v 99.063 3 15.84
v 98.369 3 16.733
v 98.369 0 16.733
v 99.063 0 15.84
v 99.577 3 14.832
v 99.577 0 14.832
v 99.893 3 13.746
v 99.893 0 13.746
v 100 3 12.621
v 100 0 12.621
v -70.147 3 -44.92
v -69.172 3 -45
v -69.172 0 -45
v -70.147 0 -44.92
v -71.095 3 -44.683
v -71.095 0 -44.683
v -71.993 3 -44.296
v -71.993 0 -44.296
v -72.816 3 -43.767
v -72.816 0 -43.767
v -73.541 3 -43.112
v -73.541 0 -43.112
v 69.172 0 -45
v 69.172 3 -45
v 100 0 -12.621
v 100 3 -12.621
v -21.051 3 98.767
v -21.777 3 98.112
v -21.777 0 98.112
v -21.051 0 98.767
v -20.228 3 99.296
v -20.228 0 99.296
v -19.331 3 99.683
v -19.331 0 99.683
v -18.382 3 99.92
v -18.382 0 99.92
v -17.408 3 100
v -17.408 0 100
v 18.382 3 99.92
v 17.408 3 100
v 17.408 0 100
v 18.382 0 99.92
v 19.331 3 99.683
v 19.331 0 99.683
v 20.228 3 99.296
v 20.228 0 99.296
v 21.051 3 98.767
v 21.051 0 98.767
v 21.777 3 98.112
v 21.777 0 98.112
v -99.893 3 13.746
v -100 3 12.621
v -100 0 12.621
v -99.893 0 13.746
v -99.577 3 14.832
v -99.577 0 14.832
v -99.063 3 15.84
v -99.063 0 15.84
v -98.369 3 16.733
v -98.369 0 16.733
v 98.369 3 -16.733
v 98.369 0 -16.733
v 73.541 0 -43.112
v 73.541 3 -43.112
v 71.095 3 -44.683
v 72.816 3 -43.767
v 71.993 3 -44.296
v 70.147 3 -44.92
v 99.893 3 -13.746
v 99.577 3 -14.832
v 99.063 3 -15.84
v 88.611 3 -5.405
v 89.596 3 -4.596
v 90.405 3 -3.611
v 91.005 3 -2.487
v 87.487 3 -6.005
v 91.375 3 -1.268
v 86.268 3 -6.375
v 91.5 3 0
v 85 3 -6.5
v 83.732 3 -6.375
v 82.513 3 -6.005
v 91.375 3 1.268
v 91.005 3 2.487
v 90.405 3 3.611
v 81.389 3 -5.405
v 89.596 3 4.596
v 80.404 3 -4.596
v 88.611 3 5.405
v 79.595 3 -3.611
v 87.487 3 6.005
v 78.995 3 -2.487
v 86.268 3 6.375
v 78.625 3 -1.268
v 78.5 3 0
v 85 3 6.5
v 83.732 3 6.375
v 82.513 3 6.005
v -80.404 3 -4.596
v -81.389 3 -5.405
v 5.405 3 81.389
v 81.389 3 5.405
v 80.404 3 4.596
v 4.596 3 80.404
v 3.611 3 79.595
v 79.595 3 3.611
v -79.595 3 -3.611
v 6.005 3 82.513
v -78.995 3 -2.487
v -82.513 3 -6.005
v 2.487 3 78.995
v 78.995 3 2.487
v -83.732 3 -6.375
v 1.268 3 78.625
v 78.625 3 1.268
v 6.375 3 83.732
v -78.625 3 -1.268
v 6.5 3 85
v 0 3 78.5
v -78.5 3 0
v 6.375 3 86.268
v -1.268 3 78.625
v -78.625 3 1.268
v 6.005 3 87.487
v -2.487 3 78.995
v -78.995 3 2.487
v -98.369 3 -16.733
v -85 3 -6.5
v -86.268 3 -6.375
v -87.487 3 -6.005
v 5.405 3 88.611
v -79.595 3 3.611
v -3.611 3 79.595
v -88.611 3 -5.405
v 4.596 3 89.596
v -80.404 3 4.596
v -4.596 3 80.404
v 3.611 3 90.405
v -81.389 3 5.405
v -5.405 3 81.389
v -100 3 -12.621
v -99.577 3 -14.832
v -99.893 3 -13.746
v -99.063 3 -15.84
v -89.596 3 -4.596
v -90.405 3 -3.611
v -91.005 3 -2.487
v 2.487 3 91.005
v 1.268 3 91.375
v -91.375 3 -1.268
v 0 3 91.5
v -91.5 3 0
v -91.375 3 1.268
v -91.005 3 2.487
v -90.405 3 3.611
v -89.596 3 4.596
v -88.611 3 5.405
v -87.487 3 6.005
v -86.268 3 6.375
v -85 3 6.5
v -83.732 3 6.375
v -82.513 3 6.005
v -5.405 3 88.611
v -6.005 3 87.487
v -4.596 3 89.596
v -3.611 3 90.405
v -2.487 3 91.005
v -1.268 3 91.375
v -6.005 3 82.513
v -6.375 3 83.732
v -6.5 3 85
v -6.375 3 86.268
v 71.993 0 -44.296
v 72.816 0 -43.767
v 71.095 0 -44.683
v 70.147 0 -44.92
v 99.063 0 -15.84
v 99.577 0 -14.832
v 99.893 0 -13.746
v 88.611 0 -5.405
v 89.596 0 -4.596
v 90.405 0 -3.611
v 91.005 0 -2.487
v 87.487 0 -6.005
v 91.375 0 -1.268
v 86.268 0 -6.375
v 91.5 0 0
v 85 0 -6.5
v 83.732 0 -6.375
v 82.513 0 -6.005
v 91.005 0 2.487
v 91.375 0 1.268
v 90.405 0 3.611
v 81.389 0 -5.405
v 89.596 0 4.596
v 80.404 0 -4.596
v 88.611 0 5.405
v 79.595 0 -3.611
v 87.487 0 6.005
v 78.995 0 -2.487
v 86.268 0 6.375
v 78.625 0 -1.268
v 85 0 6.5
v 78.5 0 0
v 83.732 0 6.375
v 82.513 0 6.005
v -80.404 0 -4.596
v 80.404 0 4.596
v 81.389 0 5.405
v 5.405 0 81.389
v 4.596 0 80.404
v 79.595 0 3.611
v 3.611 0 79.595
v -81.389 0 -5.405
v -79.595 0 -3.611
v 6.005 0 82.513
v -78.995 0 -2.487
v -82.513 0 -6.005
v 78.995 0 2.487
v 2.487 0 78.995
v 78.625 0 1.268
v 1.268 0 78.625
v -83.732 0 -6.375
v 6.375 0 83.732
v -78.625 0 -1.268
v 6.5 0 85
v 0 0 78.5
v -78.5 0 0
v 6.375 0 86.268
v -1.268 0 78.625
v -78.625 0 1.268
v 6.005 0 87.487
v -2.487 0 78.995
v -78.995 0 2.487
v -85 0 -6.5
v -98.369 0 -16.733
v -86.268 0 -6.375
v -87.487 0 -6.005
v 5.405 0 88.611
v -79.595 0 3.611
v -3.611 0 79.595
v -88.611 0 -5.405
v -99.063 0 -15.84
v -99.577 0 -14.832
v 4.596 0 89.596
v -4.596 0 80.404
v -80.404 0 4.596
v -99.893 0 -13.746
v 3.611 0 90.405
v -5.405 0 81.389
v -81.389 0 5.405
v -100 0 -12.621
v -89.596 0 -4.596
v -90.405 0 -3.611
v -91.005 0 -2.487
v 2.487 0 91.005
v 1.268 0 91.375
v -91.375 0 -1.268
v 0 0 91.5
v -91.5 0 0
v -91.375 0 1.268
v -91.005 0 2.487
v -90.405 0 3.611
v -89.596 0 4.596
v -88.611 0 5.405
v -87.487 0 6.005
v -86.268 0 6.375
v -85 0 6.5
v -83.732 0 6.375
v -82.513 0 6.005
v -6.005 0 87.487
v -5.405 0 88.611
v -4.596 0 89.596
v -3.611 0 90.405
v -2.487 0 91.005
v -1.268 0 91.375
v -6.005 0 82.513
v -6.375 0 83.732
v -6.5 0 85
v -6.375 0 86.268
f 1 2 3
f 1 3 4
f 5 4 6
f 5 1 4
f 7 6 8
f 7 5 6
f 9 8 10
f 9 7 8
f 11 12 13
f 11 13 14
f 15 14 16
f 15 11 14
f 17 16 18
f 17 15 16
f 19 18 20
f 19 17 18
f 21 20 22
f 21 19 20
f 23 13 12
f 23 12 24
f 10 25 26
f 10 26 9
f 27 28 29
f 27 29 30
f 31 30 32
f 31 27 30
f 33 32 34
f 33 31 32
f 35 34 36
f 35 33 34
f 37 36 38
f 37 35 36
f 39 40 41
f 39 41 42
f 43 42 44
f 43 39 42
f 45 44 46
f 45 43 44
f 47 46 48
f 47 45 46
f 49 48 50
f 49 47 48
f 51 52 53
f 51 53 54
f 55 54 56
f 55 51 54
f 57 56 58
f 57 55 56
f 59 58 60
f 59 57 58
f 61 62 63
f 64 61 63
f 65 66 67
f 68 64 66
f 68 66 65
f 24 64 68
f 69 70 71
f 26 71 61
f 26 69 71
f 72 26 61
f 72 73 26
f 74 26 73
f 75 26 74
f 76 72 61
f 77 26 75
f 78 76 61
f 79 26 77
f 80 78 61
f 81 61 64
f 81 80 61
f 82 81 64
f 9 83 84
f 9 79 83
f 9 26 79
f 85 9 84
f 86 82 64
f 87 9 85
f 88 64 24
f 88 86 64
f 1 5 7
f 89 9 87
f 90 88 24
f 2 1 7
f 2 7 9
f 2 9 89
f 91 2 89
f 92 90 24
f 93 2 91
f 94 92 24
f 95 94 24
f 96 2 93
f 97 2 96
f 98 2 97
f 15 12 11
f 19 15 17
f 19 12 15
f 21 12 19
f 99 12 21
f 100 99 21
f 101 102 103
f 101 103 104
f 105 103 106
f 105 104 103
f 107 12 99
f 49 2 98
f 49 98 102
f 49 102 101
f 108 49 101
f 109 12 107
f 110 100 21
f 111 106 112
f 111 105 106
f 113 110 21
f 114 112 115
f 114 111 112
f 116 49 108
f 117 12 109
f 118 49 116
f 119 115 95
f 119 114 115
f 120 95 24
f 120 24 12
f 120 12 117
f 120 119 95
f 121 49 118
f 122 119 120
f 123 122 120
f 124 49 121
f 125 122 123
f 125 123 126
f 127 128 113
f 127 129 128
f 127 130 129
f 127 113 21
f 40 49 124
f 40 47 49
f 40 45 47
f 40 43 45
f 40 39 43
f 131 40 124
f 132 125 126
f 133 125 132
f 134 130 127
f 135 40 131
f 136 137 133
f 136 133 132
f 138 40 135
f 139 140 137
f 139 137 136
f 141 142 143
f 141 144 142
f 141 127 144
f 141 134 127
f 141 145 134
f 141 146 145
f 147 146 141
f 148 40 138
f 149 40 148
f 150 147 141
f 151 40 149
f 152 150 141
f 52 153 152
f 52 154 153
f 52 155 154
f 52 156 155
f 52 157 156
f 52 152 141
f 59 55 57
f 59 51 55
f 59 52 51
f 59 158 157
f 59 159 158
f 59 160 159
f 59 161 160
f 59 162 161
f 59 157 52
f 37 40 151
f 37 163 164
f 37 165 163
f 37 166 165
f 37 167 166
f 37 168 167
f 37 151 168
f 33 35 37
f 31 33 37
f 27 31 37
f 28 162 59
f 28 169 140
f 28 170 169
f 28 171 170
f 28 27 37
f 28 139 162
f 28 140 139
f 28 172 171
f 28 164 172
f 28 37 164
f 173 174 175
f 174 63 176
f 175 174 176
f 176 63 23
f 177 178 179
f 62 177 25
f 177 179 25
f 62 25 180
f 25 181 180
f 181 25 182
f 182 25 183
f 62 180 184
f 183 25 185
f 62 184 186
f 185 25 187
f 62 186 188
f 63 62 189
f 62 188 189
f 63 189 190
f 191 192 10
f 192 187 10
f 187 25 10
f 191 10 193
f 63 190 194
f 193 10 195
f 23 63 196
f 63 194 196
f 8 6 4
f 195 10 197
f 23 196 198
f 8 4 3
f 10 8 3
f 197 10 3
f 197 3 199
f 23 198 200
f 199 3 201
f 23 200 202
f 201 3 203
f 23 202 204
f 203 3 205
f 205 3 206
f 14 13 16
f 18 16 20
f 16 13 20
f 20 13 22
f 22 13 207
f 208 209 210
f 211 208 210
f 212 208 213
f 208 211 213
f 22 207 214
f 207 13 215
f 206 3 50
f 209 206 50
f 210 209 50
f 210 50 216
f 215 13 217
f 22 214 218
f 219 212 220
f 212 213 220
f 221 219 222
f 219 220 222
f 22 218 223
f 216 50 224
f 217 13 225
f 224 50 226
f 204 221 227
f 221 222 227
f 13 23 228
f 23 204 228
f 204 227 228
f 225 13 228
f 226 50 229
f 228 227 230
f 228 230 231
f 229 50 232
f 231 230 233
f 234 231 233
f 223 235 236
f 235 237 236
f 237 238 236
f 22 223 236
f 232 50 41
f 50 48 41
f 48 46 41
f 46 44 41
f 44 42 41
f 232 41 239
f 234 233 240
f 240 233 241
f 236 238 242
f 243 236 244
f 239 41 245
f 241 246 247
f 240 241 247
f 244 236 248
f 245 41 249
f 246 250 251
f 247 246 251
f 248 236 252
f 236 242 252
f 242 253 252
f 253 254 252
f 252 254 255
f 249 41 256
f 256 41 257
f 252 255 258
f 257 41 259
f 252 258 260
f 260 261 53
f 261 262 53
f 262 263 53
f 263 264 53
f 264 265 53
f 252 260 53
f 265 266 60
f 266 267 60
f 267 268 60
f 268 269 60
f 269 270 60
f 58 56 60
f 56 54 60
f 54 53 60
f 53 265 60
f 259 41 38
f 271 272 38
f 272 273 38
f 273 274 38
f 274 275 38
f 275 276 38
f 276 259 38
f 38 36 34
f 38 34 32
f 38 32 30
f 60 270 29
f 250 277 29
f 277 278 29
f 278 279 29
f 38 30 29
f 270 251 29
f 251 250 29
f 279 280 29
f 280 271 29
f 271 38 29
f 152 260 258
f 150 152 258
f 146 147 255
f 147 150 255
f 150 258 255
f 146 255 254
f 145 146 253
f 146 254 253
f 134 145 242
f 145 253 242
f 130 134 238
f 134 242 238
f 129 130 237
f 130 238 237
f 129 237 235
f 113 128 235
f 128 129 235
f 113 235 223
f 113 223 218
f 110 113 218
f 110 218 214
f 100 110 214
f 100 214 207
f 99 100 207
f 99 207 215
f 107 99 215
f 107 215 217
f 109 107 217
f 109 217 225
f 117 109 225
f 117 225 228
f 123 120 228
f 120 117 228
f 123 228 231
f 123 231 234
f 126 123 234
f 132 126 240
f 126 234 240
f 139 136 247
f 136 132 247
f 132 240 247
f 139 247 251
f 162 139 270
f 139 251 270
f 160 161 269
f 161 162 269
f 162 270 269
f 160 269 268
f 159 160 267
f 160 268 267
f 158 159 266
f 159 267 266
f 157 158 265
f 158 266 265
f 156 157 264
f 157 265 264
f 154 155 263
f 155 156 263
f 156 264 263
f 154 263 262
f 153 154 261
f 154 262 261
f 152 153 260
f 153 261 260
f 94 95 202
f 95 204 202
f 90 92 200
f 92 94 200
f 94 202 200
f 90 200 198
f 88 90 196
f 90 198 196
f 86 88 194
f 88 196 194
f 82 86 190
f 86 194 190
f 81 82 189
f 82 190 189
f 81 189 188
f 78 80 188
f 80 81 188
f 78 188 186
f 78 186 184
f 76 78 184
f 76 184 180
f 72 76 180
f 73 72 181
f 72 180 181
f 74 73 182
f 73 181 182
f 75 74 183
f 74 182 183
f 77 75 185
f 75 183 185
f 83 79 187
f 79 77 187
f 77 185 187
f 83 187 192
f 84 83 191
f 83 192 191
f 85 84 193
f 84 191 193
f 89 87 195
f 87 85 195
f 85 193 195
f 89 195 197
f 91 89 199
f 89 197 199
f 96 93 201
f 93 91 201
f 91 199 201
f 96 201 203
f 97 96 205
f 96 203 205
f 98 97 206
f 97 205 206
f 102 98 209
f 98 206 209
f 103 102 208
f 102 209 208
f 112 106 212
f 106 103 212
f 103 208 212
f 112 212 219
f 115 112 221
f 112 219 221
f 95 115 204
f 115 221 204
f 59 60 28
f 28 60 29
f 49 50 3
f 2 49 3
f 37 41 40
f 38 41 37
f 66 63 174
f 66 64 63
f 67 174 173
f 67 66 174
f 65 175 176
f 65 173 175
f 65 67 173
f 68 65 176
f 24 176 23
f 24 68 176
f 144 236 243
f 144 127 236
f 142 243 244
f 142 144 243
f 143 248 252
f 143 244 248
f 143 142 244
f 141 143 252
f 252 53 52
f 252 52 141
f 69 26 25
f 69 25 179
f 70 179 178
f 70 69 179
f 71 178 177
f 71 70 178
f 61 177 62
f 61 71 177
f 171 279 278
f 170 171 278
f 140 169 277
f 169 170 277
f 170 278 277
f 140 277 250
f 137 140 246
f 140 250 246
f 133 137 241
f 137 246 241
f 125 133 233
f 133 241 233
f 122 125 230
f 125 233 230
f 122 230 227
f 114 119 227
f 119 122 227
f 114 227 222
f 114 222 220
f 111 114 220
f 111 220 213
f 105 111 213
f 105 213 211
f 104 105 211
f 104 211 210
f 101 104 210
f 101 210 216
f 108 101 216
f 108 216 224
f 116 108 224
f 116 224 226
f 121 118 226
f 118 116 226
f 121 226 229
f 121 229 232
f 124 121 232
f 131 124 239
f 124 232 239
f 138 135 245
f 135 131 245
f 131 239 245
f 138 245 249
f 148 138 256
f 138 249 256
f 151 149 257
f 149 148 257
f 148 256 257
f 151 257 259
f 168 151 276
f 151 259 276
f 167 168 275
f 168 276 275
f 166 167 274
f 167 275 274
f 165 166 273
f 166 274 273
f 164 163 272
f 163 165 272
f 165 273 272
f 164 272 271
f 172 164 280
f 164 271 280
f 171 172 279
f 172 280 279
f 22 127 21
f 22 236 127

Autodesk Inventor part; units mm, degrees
ref_plane "YZ Plane" through (0, 0, 0) normal (1, 0, 0) x (0, 1, 0)
ref_plane "XZ Plane" through (0, 0, 0) normal (0, 1, 0) x (-1, 0, 0)
ref_plane "XY Plane" through (0, 0, 0) normal (0, 0, 1) x (1, 0, 0)
sketch "Sketch1" plane through (0, 0, 0) normal (0, 1, 0) x (-1, 0, 0)
  line L0 (40, 40) -> (-40, 40) construction
  line L1 (-40, 40) -> (-40, -40) construction
  line L2 (-40, -40) -> (40, -40) construction
  line L3 (40, -40) -> (40, 40) construction
  line L4 (-40, 40) -> (40, -40) construction
  line L5 (100, -45) -> (-100, -45)
  line L6 (-100, -45) -> (-100, 100)
  line L7 (-100, 100) -> (100, 100)
  line L8 (100, 100) -> (100, -45)
  circle A0 centre (85, 0) radius 6.5
  circle A1 centre (0, 85) radius 6.5
  circle A2 centre (-85, 0) radius 6.5
  line L9 (0, 40) -> (0, -40) construction
  line L10 (100, 15) -> (20, 100)
  line L11 (-20, 100) -> (-100, 15)
  line L12 (100, -15) -> (71.7647, -45)
  line L13 (-100, -15) -> (-71.7647, -45)
  line L14 (0, 0) -> (-40, 0) construction
  point P0 (0, 0)
  point P1 (0, 0)
  dimension "d2" = 80
  dimension "d3" = 80
  dimension "d17" = 5
  dimension "d18" = 13
  dimension "d19" = 45
  dimension "d20" = 45
  dimension "d21" = 40
  dimension "d22" = 15
  dimension "d23" = 15
  dimension "d24" = 30
extrude "Plate1" add sketch "Sketch1" along normal blind 3 contours L5 L13 L6 L11 L7 L10 L8 L12
fillet "Corner Round2" radius 6 8 edges at (-20, 1.5, 100) (20, 1.5, 100) (100, 1.5, 15) (100, 1.5, -15) (71.7647, 1.5, -45) (-100, 1.5, 15) (-100, 1.5, -15) (-71.7647, 1.5, -45)
equation "\"d20\" = d19"
equation "\"d23\" = d22"
equation "\"BendReliefWidth\" = Thickness"
equation "\"BendReliefDepth\" = 0.5 * Thickness"
equation "\"CornerReliefSize\" = 4 * Thickness"
equation "\"MinimumRemnant\" = 2 * Thickness"
equation "\"TransitionRadius\" = BendRadius"
equation "\"JacobiRadiusSize\" = BendRadius"
equation "\"GapSize\" = Thickness"
properties part number "MSC 907 flange frame heel" material "Stainless Steel"
